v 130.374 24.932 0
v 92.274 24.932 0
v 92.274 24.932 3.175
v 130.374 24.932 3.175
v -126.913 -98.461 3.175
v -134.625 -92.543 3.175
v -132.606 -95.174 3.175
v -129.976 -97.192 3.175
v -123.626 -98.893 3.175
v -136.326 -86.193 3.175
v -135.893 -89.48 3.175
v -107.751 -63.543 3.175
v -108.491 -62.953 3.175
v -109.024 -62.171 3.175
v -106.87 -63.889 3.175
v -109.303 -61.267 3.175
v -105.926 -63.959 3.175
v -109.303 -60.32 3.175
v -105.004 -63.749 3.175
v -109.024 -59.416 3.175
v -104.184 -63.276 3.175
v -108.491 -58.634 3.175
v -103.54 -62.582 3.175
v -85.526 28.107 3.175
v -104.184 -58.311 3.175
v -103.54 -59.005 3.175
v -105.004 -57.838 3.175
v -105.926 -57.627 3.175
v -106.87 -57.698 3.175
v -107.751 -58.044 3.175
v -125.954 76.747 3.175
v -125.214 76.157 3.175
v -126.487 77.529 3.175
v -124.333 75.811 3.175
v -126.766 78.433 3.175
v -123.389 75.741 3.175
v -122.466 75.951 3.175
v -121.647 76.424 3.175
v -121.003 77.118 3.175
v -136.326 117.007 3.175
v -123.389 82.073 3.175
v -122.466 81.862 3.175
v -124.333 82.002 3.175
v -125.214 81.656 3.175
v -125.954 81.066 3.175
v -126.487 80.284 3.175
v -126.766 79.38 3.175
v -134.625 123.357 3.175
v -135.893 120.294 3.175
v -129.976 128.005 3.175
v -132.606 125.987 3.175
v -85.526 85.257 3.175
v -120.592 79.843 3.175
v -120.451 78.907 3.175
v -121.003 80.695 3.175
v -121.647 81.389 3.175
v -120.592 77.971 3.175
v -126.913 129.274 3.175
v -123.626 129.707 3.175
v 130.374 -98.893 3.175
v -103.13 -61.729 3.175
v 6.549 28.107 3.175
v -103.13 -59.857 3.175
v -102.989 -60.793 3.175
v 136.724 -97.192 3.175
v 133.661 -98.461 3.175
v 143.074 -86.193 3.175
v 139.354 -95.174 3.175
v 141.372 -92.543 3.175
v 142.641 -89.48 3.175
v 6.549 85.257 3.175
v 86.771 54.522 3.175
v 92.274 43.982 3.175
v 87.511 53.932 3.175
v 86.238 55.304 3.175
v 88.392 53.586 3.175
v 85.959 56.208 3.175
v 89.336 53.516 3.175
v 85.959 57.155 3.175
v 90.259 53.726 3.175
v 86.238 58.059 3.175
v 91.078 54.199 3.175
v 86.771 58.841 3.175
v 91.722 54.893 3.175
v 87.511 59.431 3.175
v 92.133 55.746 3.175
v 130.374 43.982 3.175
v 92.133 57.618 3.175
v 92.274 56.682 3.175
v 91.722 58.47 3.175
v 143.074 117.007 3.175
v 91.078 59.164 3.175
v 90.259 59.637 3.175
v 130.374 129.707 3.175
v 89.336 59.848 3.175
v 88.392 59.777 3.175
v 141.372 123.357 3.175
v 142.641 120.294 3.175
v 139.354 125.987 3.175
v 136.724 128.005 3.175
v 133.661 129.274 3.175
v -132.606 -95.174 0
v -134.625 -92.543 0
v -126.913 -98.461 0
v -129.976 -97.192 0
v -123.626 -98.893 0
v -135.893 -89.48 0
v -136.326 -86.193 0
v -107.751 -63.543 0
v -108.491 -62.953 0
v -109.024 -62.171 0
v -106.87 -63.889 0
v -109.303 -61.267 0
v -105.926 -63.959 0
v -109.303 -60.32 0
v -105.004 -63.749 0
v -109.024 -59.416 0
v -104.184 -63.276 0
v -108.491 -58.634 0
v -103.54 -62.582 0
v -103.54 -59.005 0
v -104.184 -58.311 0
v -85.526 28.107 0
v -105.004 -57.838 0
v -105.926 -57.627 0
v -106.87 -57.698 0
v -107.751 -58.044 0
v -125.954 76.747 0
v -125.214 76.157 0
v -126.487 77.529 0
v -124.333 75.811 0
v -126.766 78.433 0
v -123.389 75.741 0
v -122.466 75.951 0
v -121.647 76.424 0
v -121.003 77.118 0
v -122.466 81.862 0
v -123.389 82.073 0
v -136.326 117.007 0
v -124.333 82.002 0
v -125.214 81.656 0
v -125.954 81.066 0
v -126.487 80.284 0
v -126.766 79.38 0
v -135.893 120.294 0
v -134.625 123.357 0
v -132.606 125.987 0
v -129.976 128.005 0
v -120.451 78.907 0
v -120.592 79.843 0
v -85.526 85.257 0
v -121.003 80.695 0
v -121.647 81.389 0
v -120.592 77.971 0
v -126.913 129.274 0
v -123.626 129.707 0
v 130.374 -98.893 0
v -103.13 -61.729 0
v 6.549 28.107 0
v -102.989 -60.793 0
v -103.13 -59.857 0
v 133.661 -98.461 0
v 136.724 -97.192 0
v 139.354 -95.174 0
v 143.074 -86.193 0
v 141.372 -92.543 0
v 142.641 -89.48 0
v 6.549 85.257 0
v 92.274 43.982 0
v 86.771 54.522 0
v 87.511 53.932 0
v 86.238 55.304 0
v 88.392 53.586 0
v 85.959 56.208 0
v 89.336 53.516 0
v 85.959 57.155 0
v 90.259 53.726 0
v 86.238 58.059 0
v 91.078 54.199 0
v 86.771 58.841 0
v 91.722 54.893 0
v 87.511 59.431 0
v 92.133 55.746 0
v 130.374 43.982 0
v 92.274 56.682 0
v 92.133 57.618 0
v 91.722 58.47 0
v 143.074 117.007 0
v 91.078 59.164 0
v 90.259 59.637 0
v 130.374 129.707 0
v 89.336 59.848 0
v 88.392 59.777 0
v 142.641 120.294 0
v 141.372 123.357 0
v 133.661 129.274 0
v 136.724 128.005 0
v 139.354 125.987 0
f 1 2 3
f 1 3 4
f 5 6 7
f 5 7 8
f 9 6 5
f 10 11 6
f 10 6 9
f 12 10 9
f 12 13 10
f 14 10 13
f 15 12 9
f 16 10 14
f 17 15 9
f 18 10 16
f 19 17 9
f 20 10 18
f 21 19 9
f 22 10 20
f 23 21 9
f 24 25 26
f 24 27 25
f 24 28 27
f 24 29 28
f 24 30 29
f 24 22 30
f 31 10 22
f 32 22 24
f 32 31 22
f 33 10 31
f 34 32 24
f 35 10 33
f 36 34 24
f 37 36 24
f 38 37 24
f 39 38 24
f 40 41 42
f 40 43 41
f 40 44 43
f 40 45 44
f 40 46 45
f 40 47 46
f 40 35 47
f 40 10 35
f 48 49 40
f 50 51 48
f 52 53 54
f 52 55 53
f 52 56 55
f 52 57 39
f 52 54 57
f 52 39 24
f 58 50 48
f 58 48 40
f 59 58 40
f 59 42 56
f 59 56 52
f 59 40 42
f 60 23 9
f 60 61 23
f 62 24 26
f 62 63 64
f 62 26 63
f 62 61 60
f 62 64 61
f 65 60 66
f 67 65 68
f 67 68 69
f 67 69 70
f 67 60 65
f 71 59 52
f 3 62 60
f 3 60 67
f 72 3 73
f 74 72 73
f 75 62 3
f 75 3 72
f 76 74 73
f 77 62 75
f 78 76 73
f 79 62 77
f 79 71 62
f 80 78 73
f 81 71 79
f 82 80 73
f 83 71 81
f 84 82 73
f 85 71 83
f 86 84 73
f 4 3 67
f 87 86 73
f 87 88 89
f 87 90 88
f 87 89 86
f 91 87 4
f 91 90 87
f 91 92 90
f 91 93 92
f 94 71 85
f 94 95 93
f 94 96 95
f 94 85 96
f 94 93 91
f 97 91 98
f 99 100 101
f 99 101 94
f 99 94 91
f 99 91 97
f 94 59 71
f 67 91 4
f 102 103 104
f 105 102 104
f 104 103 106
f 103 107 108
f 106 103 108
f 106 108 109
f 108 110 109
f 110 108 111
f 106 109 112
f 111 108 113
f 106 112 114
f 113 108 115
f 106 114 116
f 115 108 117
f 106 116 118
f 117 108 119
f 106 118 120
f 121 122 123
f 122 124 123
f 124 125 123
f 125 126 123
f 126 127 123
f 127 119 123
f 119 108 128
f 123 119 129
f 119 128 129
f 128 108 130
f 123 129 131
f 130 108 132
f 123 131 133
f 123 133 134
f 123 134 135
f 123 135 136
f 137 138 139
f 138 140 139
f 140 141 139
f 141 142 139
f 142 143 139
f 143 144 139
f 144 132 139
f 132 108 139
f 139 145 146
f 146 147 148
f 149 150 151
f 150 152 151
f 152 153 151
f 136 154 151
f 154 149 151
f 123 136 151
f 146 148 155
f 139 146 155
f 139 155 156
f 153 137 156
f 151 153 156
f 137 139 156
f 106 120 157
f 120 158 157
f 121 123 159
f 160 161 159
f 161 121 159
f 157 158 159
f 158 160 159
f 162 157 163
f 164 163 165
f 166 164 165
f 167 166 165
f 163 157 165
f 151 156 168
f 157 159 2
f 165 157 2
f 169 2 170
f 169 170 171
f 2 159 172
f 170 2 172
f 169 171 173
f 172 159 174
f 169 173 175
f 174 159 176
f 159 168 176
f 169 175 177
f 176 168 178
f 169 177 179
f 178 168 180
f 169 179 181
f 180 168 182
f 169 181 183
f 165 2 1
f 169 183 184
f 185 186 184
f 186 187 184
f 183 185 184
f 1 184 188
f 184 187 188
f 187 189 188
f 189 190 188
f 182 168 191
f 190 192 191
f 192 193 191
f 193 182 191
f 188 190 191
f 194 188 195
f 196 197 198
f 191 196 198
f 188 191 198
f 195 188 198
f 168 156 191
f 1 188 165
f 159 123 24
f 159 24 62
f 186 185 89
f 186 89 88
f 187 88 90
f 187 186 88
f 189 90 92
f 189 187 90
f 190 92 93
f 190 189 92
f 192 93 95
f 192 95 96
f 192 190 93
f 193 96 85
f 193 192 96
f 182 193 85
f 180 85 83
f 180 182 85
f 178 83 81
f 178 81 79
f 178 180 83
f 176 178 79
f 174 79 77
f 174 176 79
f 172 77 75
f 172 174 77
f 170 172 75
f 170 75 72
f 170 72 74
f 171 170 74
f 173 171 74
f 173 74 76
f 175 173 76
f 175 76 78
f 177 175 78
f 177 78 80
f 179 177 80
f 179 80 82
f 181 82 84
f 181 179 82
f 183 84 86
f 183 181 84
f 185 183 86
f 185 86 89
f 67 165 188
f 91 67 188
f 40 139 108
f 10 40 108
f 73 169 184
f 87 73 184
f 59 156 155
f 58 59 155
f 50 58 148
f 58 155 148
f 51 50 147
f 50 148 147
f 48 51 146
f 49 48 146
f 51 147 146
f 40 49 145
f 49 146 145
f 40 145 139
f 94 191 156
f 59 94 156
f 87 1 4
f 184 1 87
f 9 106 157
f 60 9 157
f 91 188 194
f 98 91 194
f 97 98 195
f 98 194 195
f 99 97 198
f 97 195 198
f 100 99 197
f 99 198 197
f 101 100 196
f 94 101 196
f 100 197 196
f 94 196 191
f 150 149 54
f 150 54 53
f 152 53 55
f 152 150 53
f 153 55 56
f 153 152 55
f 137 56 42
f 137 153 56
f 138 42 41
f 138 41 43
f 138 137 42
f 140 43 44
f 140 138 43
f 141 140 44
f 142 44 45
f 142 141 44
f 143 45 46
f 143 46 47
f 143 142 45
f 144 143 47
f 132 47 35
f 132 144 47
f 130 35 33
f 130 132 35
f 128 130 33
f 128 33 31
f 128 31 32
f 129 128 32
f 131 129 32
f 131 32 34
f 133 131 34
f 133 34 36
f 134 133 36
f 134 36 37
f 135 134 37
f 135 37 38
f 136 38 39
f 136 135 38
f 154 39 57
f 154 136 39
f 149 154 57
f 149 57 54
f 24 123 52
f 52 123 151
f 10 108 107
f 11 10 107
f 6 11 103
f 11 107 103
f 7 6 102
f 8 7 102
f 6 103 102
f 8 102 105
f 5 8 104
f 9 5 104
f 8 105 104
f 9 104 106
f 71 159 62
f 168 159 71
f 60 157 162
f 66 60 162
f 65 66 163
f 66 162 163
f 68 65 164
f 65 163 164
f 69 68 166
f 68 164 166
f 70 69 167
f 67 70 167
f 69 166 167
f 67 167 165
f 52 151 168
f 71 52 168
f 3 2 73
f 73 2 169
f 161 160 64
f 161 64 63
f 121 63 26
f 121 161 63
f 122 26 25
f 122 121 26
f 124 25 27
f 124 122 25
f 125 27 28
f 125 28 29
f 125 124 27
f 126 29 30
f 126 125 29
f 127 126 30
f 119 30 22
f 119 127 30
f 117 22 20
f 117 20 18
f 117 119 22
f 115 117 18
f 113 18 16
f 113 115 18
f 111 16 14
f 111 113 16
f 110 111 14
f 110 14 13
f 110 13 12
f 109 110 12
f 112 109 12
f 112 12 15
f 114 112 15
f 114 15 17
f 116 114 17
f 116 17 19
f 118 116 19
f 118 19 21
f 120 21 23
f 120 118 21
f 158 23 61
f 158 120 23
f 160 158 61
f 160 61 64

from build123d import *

# Parameters (mm, degrees)
F0_R     = 3.175
F0_W     = 92.075
F0_H     = 57.15
F0_W_2   = 38.1
F0_H_2   = 19.05
F1_DEPTH = 3.175


with BuildPart() as f1:
    # F0 (on Top) → F1 (new body)
    with BuildSketch(Plane.XY):
        with BuildLine():
            Line((130.373917, 129.706656), (-123.626083, 129.706656))
            ThreePointArc((-123.626083, 129.706656), (-132.606339, 125.986912), (-136.326083, 117.006656))
            Line((-136.326083, 117.006656), (-136.326083, -86.193344))
            ThreePointArc((-136.326083, -86.193344), (-132.606339, -95.1736), (-123.626083, -98.893344))
            Line((-123.626083, -98.893344), (130.373917, -98.893344))
            ThreePointArc((130.373917, -98.893344), (139.354173, -95.1736), (143.073917, -86.193344))
            Line((143.073917, -86.193344), (143.073917, 117.006656))
            ThreePointArc((143.073917, 117.006656), (139.354173, 125.986912), (130.373917, 129.706656))
        make_face()
        with Locations((-106.163583, -60.793344)):
            Circle(F0_R, mode=Mode.SUBTRACT)
        with Locations((-39.488583, 56.681656)):
            Rectangle(F0_W, F0_H, mode=Mode.SUBTRACT)
        with Locations((-123.626083, 78.906656)):
            Circle(F0_R, mode=Mode.SUBTRACT)
        with Locations((111.323917, 34.456656)):
            Rectangle(F0_W_2, F0_H_2, mode=Mode.SUBTRACT)
        with Locations((89.098917, 56.681656)):
            Circle(F0_R, mode=Mode.SUBTRACT)
    extrude(amount=F1_DEPTH)


solid = f1.part
